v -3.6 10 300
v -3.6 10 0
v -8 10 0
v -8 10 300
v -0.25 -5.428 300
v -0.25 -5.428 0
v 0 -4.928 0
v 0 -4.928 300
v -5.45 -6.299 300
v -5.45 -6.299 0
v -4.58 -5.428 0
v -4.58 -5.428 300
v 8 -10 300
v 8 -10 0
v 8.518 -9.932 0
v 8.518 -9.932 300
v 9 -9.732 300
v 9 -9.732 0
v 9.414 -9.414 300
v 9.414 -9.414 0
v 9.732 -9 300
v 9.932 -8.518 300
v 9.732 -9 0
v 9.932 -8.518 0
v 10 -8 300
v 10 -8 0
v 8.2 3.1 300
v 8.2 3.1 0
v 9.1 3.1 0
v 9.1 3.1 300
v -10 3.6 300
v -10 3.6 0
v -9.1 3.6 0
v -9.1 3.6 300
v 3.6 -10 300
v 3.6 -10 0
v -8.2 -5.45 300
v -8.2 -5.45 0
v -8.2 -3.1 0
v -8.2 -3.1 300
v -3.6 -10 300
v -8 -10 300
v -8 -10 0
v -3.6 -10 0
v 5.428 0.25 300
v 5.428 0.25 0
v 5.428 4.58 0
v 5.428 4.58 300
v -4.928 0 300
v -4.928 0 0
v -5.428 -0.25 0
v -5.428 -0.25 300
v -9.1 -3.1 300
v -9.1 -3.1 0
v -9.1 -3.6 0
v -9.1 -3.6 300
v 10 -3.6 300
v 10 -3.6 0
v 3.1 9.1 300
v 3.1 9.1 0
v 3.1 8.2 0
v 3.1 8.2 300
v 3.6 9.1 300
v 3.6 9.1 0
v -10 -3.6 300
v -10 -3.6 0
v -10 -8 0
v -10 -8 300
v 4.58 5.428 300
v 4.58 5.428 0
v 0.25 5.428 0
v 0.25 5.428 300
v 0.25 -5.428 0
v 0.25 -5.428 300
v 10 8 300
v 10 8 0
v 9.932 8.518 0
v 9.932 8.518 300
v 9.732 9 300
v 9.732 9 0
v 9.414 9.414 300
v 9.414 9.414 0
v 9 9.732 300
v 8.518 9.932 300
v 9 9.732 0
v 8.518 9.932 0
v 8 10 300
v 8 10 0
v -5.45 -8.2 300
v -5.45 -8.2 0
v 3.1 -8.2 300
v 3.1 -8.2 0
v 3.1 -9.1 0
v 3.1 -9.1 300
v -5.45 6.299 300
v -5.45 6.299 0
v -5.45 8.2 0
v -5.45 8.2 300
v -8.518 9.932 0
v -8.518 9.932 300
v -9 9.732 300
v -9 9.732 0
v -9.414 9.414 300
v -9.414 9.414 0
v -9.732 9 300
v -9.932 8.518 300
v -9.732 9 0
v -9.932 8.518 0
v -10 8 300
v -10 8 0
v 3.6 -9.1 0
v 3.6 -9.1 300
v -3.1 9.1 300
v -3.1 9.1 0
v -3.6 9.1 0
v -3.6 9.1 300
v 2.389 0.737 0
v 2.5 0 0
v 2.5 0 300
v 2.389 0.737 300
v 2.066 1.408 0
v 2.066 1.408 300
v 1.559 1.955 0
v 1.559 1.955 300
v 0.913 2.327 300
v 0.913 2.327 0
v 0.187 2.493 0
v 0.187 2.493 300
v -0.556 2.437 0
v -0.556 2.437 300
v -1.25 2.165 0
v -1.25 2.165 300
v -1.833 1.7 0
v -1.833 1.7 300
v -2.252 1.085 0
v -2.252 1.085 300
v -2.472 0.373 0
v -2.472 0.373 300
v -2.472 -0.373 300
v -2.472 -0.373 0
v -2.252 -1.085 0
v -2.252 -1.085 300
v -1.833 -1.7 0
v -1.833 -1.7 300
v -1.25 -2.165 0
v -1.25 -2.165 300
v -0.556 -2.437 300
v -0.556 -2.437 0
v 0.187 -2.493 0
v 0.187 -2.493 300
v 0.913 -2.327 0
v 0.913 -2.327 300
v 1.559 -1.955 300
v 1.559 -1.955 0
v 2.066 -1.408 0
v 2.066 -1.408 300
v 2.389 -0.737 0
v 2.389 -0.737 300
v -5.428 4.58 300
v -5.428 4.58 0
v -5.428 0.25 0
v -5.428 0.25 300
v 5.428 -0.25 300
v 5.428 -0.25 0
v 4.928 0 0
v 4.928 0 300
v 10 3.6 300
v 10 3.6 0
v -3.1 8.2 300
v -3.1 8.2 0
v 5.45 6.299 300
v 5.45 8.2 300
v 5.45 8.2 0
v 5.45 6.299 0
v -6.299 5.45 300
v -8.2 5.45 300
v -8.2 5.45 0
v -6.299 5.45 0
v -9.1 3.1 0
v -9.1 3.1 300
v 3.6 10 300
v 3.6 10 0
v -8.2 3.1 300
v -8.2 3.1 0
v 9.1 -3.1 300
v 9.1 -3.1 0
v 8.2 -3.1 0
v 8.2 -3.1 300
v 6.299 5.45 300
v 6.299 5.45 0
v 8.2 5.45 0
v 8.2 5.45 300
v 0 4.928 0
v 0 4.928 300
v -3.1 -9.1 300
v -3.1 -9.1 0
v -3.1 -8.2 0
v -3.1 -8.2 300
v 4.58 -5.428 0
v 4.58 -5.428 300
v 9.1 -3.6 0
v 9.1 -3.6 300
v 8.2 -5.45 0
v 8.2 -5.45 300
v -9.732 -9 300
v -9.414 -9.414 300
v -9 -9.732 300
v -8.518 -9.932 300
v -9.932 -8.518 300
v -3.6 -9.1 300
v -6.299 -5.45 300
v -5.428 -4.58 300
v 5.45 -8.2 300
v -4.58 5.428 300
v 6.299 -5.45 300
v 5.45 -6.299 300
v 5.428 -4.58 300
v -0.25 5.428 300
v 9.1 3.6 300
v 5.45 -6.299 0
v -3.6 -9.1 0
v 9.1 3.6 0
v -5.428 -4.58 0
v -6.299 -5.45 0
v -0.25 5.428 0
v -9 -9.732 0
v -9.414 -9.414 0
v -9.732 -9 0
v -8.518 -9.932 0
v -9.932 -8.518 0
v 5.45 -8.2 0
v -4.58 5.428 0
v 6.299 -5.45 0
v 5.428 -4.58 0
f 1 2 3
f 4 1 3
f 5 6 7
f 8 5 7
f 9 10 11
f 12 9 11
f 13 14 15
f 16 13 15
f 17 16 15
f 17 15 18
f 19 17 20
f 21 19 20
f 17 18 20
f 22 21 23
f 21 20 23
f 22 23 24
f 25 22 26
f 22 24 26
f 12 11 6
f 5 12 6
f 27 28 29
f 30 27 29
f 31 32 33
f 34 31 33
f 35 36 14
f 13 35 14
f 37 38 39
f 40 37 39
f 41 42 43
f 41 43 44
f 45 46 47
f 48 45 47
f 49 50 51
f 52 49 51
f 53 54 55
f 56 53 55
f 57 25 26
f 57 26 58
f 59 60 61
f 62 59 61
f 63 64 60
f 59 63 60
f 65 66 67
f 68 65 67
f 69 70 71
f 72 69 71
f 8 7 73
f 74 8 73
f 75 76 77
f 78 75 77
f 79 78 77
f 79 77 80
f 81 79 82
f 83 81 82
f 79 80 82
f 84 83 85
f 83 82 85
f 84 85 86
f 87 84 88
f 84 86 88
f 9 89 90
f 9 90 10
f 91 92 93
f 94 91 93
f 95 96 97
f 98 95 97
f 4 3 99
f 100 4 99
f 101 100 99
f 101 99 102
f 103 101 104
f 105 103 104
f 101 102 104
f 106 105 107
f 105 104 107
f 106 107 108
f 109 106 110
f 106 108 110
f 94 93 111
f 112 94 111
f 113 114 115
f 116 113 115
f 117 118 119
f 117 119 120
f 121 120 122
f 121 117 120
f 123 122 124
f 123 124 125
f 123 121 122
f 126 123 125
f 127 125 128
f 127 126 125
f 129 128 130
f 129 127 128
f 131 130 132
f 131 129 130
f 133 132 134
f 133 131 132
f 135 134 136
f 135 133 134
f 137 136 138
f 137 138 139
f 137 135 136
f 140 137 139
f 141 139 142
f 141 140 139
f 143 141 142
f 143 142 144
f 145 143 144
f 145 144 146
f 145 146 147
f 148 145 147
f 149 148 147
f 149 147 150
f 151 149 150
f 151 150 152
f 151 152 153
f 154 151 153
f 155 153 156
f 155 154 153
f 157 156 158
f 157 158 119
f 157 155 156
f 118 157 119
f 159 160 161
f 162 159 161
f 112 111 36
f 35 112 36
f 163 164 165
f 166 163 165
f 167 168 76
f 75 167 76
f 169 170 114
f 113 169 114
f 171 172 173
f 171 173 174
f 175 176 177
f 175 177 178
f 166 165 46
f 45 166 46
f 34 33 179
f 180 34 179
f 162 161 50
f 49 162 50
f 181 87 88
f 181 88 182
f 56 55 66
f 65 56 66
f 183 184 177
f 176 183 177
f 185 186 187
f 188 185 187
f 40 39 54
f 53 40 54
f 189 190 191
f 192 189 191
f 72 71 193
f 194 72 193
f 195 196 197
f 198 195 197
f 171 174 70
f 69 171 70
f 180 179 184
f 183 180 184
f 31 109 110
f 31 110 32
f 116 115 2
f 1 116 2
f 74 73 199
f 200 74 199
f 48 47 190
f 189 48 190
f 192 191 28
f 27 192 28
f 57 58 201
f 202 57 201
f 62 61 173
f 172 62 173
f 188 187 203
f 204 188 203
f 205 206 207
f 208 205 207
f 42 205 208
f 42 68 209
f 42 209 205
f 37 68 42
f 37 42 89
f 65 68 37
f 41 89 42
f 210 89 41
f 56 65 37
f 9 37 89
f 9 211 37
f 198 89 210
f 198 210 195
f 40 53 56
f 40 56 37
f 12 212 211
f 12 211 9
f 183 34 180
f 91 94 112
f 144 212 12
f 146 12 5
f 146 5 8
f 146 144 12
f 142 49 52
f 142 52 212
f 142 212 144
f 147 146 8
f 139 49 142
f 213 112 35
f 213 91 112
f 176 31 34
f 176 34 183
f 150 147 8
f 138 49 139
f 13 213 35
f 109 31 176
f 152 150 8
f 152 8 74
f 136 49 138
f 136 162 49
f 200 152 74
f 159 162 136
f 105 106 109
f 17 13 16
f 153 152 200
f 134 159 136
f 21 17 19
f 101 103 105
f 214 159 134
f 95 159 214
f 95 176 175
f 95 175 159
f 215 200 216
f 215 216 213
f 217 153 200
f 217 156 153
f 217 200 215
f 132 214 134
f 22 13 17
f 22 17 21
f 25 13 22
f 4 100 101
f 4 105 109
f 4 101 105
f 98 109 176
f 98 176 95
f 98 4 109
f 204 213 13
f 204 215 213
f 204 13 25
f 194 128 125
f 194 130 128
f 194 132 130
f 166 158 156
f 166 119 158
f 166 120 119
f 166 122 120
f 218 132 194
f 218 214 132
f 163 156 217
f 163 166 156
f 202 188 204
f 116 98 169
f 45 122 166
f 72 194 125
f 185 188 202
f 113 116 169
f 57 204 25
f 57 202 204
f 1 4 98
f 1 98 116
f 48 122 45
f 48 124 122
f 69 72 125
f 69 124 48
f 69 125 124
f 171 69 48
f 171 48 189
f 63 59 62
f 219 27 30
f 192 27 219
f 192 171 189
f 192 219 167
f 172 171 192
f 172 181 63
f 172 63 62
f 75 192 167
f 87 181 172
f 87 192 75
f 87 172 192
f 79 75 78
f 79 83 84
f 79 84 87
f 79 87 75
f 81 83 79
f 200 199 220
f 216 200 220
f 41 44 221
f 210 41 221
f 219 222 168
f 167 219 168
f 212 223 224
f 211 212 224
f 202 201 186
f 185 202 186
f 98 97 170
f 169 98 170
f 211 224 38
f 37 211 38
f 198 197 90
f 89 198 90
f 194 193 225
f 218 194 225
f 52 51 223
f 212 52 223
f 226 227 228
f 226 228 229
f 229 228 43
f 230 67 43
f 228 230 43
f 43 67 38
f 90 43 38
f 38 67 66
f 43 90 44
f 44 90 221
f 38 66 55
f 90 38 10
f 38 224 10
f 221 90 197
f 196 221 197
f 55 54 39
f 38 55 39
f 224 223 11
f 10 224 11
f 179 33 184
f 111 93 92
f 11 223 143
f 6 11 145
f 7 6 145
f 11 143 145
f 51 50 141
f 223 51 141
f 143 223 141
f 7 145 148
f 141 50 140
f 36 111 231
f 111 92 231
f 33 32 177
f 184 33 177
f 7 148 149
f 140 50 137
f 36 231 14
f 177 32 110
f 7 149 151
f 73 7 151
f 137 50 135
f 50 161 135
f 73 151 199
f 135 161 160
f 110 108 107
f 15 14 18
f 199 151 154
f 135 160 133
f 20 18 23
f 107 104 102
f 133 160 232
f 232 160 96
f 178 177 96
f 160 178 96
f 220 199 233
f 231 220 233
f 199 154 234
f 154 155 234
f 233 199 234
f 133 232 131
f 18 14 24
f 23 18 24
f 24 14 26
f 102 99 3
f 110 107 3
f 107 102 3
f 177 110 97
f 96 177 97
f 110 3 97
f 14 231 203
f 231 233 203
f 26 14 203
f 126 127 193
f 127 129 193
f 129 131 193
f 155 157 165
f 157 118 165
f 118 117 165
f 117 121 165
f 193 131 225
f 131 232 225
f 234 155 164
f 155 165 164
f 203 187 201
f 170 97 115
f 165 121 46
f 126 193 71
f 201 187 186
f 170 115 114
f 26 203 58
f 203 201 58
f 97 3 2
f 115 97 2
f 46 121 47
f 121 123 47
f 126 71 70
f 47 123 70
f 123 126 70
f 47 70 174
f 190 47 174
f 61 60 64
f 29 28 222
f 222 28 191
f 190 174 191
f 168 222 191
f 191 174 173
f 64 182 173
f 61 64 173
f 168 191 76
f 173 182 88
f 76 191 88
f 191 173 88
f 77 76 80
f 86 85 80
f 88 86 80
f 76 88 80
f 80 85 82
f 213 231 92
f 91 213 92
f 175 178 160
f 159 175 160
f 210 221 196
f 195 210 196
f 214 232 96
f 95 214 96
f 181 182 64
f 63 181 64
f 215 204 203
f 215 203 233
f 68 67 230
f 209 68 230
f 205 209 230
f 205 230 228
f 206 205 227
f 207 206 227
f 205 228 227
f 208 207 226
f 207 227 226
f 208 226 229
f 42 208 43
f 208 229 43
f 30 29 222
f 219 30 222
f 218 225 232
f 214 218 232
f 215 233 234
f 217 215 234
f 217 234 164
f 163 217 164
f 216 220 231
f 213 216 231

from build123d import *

# Parameters (mm, degrees)
F0_R     = 2.5
F1_DEPTH = 300


with BuildPart() as f1:
    # F0 (on Top) → F1 (new body)
    with BuildSketch(Plane.XY):
        with BuildLine():
            ThreePointArc((10, 8), (9.414214, 9.414214), (8, 10))
            Line((8, 10), (3.6, 10))
            Line((3.6, 10), (3.6, 9.1))
            Line((3.6, 9.1), (3.1, 9.1))
            Line((3.1, 9.1), (3.1, 8.2))
            Line((3.1, 8.2), (5.45, 8.2))
            Line((5.45, 8.2), (5.45, 6.298528))
            Line((5.45, 6.298528), (4.579818, 5.428346))
            Line((4.579818, 5.428346), (0.25, 5.428346))
            Line((0.25, 5.428346), (0, 4.928346))
            Line((0, 4.928346), (-0.25, 5.428346))
            Line((-0.25, 5.428346), (-4.579818, 5.428346))
            Line((-4.579818, 5.428346), (-5.45, 6.298528))
            Line((-5.45, 6.298528), (-5.45, 8.2))
            Line((-5.45, 8.2), (-3.1, 8.2))
            Line((-3.1, 8.2), (-3.1, 9.1))
            Line((-3.1, 9.1), (-3.6, 9.1))
            Line((-3.6, 9.1), (-3.6, 10))
            Line((-3.6, 10), (-8, 10))
            ThreePointArc((-8, 10), (-9.414214, 9.414214), (-10, 8))
            Line((-10, 8), (-10, 3.6))
            Line((-10, 3.6), (-9.1, 3.6))
            Line((-9.1, 3.6), (-9.1, 3.1))
            Line((-9.1, 3.1), (-8.2, 3.1))
            Line((-8.2, 3.1), (-8.2, 5.45))
            Line((-8.2, 5.45), (-6.298528, 5.45))
            Line((-6.298528, 5.45), (-5.428346, 4.579818))
            Line((-5.428346, 4.579818), (-5.428346, 0.25))
            Line((-5.428346, 0.25), (-4.928346, 0))
            Line((-4.928346, 0), (-5.428346, -0.25))
            Line((-5.428346, -0.25), (-5.428346, -4.579818))
            Line((-5.428346, -4.579818), (-6.298528, -5.45))
            Line((-6.298528, -5.45), (-8.2, -5.45))
            Line((-8.2, -5.45), (-8.2, -3.1))
            Line((-8.2, -3.1), (-9.1, -3.1))
            Line((-9.1, -3.1), (-9.1, -3.6))
            Line((-9.1, -3.6), (-10, -3.6))
            Line((-10, -3.6), (-10, -8))
            ThreePointArc((-10, -8), (-9.414214, -9.414214), (-8, -10))
            Line((-8, -10), (-3.6, -10))
            Line((-3.6, -10), (-3.6, -9.1))
            Line((-3.6, -9.1), (-3.1, -9.1))
            Line((-3.1, -9.1), (-3.1, -8.2))
            Line((-3.1, -8.2), (-5.45, -8.2))
            Line((-5.45, -8.2), (-5.45, -6.298528))
            Line((-5.45, -6.298528), (-4.579818, -5.428346))
            Line((-4.579818, -5.428346), (-0.25, -5.428346))
            Line((-0.25, -5.428346), (0, -4.928346))
            Line((0, -4.928346), (0.25, -5.428346))
            Line((0.25, -5.428346), (4.579818, -5.428346))
            Line((4.579818, -5.428346), (5.45, -6.298528))
            Line((5.45, -6.298528), (5.45, -8.2))
            Line((5.45, -8.2), (3.1, -8.2))
            Line((3.1, -8.2), (3.1, -9.1))
            Line((3.1, -9.1), (3.6, -9.1))
            Line((3.6, -9.1), (3.6, -10))
            Line((3.6, -10), (8, -10))
            ThreePointArc((8, -10), (9.414214, -9.414214), (10, -8))
            Line((10, -8), (10, -3.6))
            Line((10, -3.6), (9.1, -3.6))
            Line((9.1, -3.6), (9.1, -3.1))
            Line((9.1, -3.1), (8.2, -3.1))
            Line((8.2, -3.1), (8.2, -5.45))
            Line((8.2, -5.45), (6.298528, -5.45))
            Line((6.298528, -5.45), (5.428346, -4.579818))
            Line((5.428346, -4.579818), (5.428346, -0.25))
            Line((5.428346, -0.25), (4.928346, 0))
            Line((4.928346, 0), (5.428346, 0.25))
            Line((5.428346, 0.25), (5.428346, 4.579818))
            Line((5.428346, 4.579818), (6.298528, 5.45))
            Line((6.298528, 5.45), (8.2, 5.45))
            Line((8.2, 5.45), (8.2, 3.1))
            Line((8.2, 3.1), (9.1, 3.1))
            Line((9.1, 3.1), (9.1, 3.6))
            Line((9.1, 3.6), (10, 3.6))
            Line((10, 3.6), (10, 8))
        make_face()
        Circle(F0_R, mode=Mode.SUBTRACT)
    extrude(amount=F1_DEPTH)


solid = f1.part
